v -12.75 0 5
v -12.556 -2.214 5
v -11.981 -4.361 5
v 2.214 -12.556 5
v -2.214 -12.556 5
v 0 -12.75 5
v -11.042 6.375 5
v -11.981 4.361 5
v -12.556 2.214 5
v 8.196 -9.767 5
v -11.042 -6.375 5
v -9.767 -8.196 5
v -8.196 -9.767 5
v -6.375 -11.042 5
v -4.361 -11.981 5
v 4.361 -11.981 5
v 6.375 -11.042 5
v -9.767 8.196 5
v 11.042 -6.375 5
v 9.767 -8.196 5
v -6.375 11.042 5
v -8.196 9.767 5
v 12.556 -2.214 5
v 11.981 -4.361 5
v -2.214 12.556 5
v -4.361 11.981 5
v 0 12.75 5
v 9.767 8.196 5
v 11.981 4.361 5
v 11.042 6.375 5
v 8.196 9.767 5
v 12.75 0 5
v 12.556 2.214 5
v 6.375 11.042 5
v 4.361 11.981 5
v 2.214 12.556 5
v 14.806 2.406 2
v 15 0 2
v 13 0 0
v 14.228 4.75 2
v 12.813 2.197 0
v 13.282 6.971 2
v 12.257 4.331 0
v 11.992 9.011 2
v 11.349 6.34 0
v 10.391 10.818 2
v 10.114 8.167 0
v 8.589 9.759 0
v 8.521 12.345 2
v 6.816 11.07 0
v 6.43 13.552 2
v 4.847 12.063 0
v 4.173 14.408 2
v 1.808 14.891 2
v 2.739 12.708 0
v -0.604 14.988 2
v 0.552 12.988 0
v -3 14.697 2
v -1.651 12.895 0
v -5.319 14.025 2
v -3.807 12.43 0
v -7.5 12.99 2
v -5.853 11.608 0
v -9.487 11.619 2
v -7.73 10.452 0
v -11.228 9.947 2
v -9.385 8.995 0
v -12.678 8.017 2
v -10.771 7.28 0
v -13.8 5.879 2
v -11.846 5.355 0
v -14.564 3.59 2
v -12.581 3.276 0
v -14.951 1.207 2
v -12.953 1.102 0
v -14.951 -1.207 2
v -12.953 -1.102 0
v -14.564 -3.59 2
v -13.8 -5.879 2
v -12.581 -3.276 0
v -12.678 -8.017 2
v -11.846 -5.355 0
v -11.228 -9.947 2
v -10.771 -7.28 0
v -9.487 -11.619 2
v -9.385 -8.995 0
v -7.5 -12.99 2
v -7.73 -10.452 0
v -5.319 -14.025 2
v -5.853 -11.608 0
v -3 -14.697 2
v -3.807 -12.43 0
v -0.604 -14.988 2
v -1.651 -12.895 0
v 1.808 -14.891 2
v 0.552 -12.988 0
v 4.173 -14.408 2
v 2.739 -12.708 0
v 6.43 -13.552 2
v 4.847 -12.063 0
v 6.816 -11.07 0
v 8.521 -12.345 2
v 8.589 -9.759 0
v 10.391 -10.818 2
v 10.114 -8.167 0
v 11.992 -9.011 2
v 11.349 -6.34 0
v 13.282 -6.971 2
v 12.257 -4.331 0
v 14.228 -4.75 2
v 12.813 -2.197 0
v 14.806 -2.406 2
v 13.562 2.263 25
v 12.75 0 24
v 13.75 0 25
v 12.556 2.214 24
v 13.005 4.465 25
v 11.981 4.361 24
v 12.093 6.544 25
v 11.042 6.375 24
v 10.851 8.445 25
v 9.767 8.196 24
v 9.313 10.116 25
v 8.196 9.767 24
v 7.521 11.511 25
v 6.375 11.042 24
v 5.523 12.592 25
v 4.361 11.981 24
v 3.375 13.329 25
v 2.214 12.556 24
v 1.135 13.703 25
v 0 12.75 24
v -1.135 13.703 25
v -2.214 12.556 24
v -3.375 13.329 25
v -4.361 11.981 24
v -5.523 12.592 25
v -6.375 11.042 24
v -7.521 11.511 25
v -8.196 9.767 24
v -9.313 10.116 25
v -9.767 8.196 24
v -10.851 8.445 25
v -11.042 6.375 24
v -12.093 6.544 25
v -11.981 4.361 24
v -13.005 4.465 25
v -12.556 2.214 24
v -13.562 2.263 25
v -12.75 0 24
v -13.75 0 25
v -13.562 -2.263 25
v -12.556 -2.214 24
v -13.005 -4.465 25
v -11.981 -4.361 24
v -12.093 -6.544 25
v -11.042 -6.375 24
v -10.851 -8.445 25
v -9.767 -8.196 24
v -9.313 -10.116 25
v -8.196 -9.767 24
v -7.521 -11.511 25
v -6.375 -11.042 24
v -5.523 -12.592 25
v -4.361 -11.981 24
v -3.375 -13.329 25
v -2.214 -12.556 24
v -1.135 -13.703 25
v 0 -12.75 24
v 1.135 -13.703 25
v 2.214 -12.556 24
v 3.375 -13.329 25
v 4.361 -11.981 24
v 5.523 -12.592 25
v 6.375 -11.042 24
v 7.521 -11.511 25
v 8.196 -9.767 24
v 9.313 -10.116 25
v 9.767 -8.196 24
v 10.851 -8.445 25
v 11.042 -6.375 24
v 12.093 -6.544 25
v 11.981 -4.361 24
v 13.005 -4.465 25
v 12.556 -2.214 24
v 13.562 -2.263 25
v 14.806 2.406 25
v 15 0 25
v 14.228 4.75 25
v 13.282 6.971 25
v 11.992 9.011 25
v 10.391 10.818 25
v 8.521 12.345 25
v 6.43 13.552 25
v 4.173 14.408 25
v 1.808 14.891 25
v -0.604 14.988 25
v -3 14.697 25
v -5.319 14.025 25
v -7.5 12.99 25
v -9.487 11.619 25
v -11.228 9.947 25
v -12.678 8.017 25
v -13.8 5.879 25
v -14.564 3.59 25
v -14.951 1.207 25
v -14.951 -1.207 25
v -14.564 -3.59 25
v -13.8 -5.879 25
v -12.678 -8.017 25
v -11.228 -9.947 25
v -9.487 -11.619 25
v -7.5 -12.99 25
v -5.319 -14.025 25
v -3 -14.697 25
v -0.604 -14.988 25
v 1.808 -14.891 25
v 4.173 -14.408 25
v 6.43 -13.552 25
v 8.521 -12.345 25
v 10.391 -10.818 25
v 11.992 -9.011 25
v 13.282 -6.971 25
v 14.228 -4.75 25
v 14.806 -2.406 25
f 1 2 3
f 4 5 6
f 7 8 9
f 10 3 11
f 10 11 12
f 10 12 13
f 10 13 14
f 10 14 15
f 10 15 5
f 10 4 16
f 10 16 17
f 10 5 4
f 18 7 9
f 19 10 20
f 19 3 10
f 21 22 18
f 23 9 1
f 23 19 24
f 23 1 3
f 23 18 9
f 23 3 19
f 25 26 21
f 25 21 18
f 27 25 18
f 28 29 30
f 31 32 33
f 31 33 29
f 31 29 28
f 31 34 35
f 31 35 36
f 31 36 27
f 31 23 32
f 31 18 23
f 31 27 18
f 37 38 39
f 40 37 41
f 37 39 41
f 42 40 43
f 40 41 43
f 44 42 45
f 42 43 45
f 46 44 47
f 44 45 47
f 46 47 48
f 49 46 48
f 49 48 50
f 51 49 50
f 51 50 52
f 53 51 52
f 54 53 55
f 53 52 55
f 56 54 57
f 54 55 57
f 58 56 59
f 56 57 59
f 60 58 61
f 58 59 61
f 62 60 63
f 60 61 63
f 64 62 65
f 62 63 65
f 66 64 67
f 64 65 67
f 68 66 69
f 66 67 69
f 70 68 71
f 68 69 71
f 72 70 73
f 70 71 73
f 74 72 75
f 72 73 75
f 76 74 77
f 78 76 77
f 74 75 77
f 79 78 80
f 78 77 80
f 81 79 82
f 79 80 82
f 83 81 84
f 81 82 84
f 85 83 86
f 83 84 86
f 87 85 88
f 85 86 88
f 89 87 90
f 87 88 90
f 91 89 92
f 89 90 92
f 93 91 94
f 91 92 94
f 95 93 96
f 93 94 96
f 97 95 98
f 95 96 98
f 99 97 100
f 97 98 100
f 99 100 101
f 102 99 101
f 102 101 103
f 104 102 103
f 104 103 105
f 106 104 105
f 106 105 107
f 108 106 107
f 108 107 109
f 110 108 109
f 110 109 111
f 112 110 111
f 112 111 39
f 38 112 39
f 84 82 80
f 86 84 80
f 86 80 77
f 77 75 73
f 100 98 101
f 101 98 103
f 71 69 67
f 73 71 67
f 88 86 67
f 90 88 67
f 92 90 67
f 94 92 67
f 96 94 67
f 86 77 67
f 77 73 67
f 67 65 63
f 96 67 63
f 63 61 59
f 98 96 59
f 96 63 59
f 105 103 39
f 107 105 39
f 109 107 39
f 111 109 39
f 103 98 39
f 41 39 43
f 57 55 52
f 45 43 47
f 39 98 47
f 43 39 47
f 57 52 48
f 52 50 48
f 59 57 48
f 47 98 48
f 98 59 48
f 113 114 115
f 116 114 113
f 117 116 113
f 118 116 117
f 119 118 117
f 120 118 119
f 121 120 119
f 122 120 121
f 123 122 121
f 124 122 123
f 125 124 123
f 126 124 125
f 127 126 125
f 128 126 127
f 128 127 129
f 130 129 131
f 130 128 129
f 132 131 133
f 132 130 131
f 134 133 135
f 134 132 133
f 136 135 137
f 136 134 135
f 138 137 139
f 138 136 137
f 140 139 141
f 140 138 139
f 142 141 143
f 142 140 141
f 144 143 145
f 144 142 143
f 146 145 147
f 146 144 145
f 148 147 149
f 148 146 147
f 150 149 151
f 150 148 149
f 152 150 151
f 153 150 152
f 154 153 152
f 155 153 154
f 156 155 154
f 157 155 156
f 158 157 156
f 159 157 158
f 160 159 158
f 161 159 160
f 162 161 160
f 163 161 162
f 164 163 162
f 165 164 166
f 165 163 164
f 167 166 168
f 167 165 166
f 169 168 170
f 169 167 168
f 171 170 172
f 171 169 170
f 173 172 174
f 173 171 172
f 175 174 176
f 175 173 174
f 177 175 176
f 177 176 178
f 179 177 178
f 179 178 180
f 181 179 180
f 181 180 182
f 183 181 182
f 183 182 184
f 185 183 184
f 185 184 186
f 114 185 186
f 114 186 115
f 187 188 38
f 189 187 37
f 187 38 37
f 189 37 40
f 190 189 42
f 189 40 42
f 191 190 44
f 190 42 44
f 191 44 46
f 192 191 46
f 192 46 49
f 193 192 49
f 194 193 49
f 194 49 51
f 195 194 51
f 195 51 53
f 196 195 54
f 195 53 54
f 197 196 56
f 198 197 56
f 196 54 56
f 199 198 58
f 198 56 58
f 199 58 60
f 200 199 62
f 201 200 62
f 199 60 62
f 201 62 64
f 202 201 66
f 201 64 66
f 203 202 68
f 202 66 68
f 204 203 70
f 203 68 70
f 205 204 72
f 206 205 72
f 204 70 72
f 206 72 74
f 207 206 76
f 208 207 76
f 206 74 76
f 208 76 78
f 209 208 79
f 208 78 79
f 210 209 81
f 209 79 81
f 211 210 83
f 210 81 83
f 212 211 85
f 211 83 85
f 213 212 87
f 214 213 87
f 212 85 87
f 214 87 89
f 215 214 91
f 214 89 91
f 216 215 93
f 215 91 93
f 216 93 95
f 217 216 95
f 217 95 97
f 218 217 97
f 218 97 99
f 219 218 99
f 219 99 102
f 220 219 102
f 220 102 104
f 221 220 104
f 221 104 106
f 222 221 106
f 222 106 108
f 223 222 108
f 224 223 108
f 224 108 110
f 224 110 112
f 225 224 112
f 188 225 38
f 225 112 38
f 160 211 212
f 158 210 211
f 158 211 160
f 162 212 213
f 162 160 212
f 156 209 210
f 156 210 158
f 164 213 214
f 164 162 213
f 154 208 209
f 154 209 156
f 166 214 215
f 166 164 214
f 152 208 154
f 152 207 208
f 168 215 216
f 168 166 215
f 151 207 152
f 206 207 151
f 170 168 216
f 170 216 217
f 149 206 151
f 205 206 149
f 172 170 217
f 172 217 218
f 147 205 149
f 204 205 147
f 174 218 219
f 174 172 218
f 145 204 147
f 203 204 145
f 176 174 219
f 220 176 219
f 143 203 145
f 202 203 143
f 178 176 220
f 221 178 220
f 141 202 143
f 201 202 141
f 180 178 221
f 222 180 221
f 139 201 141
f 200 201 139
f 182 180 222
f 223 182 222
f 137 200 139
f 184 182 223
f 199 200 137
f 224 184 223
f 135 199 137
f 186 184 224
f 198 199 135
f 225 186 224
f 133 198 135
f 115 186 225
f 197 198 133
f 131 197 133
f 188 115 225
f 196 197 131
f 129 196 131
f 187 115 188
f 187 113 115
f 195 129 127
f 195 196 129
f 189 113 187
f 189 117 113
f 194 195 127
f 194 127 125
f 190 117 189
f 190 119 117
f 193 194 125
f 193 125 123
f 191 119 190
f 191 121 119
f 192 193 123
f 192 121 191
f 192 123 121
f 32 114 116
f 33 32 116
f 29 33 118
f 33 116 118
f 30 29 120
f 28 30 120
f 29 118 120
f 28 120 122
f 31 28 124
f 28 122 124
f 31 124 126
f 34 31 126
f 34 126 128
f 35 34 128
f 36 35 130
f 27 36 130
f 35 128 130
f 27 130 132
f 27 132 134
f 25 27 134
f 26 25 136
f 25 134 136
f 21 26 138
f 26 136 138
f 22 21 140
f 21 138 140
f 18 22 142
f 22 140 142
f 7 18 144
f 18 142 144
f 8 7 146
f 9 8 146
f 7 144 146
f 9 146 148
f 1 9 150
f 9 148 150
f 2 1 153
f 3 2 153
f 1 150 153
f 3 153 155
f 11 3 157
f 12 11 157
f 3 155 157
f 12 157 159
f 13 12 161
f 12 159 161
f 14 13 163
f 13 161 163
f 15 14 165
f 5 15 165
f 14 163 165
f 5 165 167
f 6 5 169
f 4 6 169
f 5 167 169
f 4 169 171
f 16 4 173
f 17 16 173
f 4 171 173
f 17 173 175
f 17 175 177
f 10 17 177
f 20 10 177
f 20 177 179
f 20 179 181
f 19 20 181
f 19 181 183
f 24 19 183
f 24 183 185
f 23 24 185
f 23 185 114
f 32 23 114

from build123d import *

# Parameters (mm, degrees)
SKETCH_R        = 15
PAD_DEPTH       = 25
SKETCH001_R     = 12.75
POCKET_DEPTH    = 20
CHAMFER_SIZE    = 2
CHAMFER001_SIZE = 1


with BuildPart() as part:
    # Sketch (on XY_Plane of Origin) → Pad (new body)
    with BuildSketch(Plane.XY):
        Circle(SKETCH_R)
    extrude(amount=PAD_DEPTH)

    # Sketch001 (on Face3 of Pad) → Pocket (cut)
    with BuildSketch(Plane.XY.offset(25)):
        Circle(SKETCH001_R)
    extrude(amount=-POCKET_DEPTH, mode=Mode.SUBTRACT)

    # Chamfer
    chamfer_edges = [part.edges().sort_by_distance(p)[0] for p in [
        (-15, 0, 0),
    ]]
    chamfer(chamfer_edges, length=CHAMFER_SIZE)

    # Chamfer001
    chamfer001_edges = [part.edges().sort_by_distance(p)[0] for p in [
        (-12.75, 0, 25),
    ]]
    chamfer(chamfer001_edges, length=CHAMFER001_SIZE)


solid = part.part
